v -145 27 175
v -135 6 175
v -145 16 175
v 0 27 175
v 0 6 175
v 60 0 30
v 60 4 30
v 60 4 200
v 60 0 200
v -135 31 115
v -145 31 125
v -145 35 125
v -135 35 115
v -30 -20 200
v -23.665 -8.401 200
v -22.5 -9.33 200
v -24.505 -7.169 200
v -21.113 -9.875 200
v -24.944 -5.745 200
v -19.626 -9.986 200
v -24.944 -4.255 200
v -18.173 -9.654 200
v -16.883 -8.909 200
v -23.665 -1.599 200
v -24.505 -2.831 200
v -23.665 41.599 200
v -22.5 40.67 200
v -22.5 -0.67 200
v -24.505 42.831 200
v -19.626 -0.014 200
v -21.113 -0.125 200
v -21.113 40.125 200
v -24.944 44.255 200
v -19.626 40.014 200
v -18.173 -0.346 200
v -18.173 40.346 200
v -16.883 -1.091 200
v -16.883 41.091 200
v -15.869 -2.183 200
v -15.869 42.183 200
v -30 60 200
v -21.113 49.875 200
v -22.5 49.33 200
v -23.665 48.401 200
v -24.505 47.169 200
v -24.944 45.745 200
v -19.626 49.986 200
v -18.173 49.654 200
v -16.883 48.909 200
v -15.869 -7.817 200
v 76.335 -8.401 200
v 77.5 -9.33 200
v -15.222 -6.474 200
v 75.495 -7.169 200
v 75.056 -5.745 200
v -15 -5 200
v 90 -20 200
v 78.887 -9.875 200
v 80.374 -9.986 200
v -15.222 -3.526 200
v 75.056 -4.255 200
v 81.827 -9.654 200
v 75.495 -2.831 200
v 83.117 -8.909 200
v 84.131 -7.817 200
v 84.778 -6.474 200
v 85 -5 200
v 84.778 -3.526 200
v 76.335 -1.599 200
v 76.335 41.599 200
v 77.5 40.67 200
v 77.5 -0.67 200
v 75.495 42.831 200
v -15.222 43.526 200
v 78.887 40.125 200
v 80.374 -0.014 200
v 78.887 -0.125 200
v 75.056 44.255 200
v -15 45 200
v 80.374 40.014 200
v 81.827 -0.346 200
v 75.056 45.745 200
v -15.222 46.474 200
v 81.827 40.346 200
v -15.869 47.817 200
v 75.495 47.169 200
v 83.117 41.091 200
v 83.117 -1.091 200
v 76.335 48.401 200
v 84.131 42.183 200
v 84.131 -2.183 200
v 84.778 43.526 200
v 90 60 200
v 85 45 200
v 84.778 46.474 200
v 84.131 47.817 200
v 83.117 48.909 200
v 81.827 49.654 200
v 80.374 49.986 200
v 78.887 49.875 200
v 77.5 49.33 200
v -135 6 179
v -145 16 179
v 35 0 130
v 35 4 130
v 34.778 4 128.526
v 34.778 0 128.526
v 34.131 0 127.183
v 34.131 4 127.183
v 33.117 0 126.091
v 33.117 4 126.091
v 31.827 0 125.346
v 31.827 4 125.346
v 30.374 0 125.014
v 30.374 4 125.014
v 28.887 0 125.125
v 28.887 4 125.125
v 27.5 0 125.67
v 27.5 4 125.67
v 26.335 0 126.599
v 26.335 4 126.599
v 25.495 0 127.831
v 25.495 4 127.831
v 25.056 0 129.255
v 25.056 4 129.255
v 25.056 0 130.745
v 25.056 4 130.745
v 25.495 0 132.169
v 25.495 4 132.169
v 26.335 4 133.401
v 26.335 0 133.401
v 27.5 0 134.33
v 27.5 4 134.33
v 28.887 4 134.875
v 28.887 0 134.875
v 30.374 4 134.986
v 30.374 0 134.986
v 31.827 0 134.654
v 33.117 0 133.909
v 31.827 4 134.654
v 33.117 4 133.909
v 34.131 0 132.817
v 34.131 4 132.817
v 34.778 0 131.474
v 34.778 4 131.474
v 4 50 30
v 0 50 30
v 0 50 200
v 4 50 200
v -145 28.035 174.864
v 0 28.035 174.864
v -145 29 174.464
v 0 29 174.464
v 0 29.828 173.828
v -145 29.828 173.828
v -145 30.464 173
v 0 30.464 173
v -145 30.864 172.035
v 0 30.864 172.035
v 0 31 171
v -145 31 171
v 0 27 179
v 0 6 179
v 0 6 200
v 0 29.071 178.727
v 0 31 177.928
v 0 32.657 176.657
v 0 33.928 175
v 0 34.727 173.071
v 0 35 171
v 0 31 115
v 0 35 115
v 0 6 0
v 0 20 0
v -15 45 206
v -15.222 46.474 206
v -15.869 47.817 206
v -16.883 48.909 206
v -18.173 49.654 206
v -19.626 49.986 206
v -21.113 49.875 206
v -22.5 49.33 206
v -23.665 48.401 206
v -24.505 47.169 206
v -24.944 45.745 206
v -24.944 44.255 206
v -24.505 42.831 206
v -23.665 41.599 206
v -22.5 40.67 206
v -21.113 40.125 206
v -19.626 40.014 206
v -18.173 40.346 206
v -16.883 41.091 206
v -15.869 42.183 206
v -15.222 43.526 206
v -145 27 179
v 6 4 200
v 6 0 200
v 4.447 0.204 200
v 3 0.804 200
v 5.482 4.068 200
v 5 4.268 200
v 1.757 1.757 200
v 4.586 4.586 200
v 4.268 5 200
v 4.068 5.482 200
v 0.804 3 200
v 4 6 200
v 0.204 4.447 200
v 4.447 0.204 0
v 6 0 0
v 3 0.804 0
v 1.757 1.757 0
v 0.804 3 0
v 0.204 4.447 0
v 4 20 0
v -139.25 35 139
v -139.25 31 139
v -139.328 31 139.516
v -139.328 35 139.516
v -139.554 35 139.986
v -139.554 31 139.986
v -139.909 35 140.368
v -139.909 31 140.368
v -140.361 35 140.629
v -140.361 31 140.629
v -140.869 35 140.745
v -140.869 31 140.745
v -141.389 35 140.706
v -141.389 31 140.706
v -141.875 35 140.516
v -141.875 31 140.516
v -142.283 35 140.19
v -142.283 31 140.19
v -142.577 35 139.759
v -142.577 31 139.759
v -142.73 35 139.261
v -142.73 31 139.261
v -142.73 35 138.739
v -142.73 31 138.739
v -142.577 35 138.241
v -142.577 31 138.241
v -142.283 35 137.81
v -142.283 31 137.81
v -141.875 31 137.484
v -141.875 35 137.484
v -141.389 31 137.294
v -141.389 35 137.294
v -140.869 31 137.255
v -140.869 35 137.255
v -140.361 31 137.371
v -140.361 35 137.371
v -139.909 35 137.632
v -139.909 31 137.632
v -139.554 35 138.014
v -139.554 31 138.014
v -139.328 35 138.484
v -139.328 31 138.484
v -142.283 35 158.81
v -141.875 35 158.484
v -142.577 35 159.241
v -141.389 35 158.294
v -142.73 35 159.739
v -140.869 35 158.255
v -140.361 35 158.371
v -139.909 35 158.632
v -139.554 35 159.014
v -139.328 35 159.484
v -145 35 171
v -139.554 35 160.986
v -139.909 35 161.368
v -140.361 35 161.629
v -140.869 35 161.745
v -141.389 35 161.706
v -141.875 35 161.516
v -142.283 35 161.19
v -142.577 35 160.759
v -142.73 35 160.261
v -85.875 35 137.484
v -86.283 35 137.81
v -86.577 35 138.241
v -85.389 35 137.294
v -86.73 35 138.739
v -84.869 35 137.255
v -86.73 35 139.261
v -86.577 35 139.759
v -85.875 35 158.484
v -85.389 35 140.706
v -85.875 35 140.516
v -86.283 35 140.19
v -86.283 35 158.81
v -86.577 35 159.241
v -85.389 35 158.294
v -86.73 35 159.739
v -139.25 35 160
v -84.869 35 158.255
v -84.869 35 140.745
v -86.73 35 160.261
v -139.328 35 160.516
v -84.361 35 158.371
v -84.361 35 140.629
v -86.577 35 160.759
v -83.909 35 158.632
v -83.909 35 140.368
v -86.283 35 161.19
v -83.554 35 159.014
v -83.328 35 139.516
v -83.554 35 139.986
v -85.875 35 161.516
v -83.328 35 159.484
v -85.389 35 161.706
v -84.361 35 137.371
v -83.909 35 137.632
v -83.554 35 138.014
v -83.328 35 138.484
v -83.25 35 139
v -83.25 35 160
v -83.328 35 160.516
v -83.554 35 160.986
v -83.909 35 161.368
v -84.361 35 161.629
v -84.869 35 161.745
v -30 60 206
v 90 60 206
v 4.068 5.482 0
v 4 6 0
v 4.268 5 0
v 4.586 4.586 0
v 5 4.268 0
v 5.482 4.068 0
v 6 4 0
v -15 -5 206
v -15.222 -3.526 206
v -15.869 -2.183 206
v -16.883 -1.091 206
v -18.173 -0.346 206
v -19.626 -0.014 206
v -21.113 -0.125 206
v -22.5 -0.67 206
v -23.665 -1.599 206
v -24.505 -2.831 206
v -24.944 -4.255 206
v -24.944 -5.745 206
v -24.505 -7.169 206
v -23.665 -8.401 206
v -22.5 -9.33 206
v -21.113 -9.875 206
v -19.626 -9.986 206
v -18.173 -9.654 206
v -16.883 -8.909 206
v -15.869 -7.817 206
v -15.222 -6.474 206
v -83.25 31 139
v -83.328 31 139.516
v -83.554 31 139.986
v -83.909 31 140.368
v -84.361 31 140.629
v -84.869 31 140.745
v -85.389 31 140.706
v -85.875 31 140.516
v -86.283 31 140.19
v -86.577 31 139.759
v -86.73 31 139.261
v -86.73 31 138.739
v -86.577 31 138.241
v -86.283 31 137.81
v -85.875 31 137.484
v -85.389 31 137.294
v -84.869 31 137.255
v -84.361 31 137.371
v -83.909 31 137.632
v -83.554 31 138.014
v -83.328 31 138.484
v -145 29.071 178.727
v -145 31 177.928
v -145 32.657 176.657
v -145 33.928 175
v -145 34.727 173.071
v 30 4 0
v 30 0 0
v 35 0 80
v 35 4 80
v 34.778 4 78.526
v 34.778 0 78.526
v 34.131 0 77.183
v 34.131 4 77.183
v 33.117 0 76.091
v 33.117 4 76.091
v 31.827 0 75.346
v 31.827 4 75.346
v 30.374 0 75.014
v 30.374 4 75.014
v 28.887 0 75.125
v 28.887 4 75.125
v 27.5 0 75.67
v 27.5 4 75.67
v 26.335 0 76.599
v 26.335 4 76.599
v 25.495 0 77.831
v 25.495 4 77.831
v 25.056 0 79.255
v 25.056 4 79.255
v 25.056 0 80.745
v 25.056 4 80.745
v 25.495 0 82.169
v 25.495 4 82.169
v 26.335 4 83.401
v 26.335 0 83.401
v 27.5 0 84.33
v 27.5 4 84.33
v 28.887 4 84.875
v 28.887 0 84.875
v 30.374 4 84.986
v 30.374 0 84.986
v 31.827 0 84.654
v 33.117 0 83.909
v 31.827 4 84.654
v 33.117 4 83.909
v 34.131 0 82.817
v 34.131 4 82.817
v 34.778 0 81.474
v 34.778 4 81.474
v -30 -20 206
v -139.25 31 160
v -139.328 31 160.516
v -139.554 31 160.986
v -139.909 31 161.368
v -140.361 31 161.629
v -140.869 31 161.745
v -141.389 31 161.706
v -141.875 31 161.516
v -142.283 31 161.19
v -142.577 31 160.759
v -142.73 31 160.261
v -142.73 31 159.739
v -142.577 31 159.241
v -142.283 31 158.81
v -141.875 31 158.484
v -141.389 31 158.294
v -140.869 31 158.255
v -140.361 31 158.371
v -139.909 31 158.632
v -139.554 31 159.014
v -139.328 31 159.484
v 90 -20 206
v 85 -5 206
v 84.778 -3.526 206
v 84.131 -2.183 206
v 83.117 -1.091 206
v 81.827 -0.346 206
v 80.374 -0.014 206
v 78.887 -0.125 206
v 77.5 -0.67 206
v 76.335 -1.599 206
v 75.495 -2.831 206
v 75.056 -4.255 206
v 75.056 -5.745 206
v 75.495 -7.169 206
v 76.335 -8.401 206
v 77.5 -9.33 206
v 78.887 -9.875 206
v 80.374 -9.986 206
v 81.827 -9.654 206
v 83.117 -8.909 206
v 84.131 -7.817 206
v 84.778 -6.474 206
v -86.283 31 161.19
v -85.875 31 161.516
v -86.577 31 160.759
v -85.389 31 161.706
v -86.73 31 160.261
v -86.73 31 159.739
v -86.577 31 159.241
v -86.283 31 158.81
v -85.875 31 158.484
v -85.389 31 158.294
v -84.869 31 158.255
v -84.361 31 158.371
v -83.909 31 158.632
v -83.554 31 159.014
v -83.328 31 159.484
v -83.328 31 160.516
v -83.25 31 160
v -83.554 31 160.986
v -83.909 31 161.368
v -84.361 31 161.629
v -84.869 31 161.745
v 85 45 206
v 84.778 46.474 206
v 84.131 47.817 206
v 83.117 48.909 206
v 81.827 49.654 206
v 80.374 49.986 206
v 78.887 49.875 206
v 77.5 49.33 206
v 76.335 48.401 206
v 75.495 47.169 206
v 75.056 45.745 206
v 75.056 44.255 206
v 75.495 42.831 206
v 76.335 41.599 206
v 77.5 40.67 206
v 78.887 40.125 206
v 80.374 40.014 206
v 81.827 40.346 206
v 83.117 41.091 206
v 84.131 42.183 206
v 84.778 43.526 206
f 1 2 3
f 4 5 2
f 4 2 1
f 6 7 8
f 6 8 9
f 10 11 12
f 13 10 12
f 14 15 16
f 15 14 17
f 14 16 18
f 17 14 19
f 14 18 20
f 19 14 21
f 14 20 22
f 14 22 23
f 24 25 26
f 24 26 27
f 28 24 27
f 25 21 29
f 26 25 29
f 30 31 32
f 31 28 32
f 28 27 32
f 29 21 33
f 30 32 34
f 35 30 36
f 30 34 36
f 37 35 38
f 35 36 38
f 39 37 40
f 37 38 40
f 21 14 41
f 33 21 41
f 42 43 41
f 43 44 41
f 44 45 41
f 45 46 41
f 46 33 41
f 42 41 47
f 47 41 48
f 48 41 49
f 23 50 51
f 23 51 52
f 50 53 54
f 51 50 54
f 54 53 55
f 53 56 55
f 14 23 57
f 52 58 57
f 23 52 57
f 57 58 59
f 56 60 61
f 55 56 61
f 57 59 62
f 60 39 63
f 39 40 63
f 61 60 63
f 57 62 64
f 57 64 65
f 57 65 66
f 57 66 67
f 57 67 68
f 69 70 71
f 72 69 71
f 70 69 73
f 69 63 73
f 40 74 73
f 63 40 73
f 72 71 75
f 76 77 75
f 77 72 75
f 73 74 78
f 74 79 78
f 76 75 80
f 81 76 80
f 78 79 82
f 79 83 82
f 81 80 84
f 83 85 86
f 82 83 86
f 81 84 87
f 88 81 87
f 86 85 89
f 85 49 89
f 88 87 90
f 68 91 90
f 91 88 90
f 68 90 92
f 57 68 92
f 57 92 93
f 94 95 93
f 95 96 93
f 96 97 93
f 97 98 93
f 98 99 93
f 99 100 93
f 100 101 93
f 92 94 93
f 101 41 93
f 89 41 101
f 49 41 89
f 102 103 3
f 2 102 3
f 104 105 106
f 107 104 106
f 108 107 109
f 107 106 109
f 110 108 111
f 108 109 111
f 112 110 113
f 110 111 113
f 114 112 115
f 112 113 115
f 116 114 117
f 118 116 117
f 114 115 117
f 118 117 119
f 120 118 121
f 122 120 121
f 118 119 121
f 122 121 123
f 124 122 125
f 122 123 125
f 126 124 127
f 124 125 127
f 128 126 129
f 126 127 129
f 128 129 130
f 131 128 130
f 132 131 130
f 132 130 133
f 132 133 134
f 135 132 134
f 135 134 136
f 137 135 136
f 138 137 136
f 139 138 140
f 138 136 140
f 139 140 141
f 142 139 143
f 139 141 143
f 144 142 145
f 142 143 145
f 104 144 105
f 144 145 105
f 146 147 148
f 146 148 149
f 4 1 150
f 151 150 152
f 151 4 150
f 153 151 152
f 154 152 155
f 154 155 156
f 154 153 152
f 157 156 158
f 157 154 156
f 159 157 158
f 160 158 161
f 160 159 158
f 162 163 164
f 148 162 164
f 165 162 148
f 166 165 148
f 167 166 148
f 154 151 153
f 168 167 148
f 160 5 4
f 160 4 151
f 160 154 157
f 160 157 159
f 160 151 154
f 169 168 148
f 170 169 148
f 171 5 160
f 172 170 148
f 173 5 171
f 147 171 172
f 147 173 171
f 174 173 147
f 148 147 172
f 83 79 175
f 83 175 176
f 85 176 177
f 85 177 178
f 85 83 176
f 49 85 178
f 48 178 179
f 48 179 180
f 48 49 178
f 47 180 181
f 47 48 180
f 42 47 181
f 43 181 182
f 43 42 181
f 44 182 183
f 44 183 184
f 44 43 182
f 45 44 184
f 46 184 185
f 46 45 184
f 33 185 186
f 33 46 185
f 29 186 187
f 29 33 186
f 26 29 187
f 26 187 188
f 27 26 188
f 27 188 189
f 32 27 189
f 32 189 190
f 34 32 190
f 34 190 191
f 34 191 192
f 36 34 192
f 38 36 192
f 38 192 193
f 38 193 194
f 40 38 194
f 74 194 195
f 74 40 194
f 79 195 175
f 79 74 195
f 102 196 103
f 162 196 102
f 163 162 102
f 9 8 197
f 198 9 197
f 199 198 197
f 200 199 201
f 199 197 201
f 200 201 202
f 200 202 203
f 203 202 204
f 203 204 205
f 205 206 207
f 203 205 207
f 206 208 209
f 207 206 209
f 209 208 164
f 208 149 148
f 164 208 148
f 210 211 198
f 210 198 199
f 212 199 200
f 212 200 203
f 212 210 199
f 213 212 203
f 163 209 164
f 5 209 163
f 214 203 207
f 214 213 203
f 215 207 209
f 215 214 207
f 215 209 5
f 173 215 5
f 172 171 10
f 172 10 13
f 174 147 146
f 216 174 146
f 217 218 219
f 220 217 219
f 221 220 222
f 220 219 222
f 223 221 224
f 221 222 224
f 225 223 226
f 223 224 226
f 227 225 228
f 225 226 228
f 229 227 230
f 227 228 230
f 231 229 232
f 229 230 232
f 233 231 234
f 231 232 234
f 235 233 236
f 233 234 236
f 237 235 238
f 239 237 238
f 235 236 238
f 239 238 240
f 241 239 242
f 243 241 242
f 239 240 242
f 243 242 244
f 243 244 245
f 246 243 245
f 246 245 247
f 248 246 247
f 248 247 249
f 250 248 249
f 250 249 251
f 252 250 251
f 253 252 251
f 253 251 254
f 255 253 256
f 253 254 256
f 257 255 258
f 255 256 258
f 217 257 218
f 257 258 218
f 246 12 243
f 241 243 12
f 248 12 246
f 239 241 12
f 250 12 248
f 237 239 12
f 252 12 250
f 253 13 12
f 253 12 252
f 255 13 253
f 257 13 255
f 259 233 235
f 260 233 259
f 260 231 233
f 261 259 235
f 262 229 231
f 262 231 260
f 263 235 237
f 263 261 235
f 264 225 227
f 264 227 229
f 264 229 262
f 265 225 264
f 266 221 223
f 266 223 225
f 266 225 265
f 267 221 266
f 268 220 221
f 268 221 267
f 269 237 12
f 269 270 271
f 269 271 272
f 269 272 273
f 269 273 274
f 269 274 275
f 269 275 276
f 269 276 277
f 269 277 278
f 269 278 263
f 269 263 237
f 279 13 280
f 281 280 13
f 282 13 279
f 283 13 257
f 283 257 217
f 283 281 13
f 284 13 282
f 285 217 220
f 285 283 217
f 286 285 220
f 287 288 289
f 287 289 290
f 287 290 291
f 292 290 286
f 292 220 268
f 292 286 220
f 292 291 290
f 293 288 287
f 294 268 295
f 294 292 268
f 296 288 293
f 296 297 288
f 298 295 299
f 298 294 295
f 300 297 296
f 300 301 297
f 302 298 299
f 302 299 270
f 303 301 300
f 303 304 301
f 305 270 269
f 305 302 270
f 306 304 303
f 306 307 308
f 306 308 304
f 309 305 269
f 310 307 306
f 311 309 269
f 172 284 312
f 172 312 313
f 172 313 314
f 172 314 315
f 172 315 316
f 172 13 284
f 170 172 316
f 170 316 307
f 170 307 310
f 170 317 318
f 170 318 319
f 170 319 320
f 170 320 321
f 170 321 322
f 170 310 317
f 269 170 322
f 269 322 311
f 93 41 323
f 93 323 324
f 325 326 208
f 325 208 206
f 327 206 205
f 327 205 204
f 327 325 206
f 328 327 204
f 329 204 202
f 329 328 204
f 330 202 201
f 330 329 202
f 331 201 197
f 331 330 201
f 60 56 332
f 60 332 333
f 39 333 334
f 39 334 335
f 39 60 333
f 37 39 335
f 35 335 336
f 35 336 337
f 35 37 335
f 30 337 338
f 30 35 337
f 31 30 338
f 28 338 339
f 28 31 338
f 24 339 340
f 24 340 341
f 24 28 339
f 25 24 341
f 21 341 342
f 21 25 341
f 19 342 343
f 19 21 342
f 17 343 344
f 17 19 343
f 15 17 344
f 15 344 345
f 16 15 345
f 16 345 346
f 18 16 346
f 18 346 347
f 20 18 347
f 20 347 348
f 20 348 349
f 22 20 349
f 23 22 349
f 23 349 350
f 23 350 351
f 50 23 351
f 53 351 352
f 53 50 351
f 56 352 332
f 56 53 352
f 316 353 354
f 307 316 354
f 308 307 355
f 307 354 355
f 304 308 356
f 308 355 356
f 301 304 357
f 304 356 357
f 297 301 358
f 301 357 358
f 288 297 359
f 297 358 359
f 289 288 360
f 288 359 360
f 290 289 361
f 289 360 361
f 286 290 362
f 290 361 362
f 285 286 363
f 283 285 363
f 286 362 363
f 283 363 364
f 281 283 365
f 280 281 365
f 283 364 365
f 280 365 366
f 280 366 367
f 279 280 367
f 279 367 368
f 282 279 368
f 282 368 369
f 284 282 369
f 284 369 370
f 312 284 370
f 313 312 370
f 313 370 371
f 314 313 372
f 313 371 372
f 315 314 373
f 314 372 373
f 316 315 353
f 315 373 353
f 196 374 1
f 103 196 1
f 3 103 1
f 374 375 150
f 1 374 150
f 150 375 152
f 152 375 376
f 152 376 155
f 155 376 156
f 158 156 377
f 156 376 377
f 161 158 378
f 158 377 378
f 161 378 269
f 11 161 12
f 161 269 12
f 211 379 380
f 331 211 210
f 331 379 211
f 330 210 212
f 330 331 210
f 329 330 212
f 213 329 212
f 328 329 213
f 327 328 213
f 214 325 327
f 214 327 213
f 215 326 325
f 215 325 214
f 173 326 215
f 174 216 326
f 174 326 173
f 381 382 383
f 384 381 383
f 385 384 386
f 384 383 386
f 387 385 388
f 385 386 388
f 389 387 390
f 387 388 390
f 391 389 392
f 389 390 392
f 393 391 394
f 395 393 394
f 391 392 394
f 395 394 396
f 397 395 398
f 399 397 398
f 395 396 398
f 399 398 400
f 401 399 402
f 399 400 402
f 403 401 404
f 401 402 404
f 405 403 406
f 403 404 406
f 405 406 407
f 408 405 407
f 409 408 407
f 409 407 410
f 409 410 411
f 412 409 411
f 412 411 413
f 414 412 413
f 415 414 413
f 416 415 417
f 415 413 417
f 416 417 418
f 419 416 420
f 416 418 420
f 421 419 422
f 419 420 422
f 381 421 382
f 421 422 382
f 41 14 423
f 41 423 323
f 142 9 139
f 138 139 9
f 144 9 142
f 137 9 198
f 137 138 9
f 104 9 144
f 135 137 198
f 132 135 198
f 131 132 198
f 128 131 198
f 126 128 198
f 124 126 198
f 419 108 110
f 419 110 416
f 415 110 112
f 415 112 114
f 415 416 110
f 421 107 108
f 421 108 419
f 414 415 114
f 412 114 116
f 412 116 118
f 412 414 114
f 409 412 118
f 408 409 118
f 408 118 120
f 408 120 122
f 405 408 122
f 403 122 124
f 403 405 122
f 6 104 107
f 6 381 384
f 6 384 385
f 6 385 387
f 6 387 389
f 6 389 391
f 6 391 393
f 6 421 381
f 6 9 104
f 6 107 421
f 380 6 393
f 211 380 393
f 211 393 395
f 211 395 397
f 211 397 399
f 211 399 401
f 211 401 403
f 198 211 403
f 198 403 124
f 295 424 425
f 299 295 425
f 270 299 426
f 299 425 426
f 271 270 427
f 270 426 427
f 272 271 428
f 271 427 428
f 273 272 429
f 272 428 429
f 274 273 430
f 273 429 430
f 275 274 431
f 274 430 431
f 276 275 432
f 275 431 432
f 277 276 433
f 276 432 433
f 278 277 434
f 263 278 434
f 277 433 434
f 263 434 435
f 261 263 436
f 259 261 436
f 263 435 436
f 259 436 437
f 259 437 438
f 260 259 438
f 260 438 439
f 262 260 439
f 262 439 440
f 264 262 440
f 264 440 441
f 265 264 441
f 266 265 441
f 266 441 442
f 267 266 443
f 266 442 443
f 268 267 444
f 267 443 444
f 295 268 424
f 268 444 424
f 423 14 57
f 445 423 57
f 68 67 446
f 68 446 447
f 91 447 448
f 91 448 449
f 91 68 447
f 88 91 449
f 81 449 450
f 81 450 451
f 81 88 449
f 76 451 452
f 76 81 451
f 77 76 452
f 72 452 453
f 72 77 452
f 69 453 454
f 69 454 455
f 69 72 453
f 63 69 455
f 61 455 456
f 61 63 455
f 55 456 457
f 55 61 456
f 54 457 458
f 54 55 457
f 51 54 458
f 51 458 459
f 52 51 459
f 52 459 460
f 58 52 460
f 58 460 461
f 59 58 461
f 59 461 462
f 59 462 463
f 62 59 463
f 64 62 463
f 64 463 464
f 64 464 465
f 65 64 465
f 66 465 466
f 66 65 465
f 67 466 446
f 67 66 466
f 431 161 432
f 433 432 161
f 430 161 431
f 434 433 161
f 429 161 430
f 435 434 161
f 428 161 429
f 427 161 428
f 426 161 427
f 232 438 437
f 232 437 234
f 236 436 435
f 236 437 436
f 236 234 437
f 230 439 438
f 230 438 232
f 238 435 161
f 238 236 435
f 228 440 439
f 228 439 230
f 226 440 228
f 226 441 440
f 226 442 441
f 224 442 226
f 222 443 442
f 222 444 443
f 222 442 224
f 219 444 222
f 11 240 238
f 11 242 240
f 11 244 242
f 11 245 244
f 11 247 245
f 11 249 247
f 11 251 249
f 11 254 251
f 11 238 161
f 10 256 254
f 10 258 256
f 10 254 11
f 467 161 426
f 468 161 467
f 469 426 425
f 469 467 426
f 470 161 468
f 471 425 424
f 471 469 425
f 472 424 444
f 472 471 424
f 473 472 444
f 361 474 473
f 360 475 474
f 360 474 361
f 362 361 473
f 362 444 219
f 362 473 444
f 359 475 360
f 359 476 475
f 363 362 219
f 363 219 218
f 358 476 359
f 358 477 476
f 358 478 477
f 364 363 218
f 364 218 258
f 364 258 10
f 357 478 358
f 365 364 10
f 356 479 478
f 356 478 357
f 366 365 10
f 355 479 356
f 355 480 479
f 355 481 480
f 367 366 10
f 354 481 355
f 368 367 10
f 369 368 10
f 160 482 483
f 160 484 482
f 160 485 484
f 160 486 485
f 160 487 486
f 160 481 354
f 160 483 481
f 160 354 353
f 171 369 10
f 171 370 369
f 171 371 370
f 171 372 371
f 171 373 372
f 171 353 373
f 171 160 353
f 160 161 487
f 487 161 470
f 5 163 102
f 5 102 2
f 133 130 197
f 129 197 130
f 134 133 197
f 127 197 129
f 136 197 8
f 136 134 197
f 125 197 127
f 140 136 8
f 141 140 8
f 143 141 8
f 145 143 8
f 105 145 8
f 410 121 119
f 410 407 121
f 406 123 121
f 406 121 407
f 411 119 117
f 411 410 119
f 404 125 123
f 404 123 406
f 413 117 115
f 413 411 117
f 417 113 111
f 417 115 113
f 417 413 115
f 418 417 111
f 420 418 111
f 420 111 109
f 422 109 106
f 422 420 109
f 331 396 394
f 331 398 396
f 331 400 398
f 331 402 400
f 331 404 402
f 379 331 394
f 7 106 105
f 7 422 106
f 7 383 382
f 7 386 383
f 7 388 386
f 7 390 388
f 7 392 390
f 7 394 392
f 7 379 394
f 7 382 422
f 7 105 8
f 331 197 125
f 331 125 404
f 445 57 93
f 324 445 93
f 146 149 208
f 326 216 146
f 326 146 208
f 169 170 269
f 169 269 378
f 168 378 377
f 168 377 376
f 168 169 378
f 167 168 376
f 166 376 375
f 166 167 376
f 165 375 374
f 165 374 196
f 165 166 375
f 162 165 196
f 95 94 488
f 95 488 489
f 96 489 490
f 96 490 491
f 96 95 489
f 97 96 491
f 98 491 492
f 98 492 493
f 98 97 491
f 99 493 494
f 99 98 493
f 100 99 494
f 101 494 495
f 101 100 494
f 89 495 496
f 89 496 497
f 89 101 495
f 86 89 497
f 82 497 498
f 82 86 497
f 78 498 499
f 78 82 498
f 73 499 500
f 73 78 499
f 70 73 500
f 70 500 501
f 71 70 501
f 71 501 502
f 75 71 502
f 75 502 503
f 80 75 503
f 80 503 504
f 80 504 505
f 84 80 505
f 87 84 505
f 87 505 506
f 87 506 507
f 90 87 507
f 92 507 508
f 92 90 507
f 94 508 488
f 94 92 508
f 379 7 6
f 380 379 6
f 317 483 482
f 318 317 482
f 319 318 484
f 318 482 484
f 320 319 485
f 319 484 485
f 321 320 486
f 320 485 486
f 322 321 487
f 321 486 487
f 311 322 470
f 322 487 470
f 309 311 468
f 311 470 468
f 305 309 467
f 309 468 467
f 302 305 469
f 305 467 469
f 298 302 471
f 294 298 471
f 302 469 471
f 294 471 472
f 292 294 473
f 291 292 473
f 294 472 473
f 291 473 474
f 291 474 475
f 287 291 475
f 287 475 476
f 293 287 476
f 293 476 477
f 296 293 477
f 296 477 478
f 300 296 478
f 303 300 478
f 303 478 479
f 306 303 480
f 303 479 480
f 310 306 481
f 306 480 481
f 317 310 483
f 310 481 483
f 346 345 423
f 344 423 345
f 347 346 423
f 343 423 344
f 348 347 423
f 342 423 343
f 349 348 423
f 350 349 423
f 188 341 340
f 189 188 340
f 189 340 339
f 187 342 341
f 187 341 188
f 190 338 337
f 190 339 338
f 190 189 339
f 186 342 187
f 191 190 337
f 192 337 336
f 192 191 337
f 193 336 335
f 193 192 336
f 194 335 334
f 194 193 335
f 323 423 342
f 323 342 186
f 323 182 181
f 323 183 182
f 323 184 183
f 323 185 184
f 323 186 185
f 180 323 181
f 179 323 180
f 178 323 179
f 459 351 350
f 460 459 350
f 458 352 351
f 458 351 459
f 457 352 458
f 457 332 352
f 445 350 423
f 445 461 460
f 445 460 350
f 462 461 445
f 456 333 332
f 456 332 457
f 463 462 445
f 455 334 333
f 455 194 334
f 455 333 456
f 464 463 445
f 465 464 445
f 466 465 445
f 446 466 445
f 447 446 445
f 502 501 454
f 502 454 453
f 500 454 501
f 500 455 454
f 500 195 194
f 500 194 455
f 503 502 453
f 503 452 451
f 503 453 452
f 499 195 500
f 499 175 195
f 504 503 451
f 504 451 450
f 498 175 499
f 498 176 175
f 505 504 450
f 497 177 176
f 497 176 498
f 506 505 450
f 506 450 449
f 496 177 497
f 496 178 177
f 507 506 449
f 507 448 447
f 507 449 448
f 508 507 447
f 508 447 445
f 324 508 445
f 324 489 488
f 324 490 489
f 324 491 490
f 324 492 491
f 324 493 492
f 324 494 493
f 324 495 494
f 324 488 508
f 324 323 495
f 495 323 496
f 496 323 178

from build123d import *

# Parameters (mm, degrees)
EXTRUDE_1_DEPTH     = 200
SKETCH_2_W          = 120
SKETCH_2_H          = 80
SKETCH_2_R          = 5
EXTRUDE_2_DEPTH     = 6
CHAMFER_1_SIZE      = 30
SKETCH_3_R          = 5
CUT_EXTRUDE_1_DEPTH = 4
EXTRUDE_3_DEPTH     = 145
CHAMFER_2_SIZE      = 10
SKETCH_7_R          = 1.75
CUT_EXTRUDE_2_DEPTH = 4


with BuildPart() as part:
    # 草图1 → 凸台-拉伸1 (new body)
    with BuildSketch(Plane.XY):
        with BuildLine():
            Line((0, 6), (0, 50))
            Line((0, 50), (4, 50))
            Line((4, 50), (4, 6))
            ThreePointArc((4, 6), (4.585786438, 4.585786438), (6, 4))
            Line((6, 4), (60, 4))
            Line((60, 4), (60, 0))
            Line((60, 0), (6, 0))
            ThreePointArc((6, 0), (1.757359313, 1.757359313), (0, 6))
        make_face()
    extrude(amount=EXTRUDE_1_DEPTH)

    # 倒角1
    chamfer_1_edges = [part.edges().sort_by_distance(p)[0] for p in [
        (2, 50, 0),
        (60, 2, 0),
    ]]
    chamfer(chamfer_1_edges, length=CHAMFER_1_SIZE)

    # 草图3 → 切除-拉伸1 (cut)
    with BuildSketch(Plane(origin=(0, 4, 0), x_dir=(1, 0, 0), z_dir=(0, 1, 0))):
        with Locations((30, -130)):
            Circle(SKETCH_3_R)
        with Locations((30, -80)):
            Circle(SKETCH_3_R)
    extrude(amount=-CUT_EXTRUDE_1_DEPTH, mode=Mode.SUBTRACT)

    # 草图4 → 凸台-拉伸3 (add)
    with BuildSketch(Plane.ZY):
        with BuildLine():
            Line((179, 6), (175, 6))
            Line((175, 6), (175, 27))
            ThreePointArc((175, 27), (173.828427125, 29.828427125), (171, 31))
            Line((171, 31), (115, 31))
            Line((115, 31), (115, 35))
            Line((115, 35), (171, 35))
            ThreePointArc((171, 35), (176.656854249, 32.656854249), (179, 27))
            Line((179, 27), (179, 6))
        make_face()
    extrude(amount=EXTRUDE_3_DEPTH)

    # 倒角2
    chamfer_2_edges = [part.edges().sort_by_distance(p)[0] for p in [
        (-145, 6, 177),
        (-145, 33, 115),
    ]]
    chamfer(chamfer_2_edges, length=CHAMFER_2_SIZE)

    # 草图7 → 切除-拉伸2 (cut)
    with BuildSketch(Plane.XZ.offset(-31)):
        with Locations((-141, 160)):
            Circle(SKETCH_7_R)
        with Locations((-141, 139)):
            Circle(SKETCH_7_R)
        with Locations((-85, 139)):
            Circle(SKETCH_7_R)
        with Locations((-85, 160)):
            Circle(SKETCH_7_R)
    extrude(amount=-CUT_EXTRUDE_2_DEPTH, mode=Mode.SUBTRACT)


with BuildPart() as body_2:
    # 草图2 → 凸台-拉伸2 (new body)
    with BuildSketch(Plane.XY.offset(200)):
        with Locations((30, 20)):
            Rectangle(SKETCH_2_W, SKETCH_2_H)
        with Locations((-20, 45)):
            Circle(SKETCH_2_R, mode=Mode.SUBTRACT)
        with Locations((80, 45)):
            Circle(SKETCH_2_R, mode=Mode.SUBTRACT)
        with Locations((-20, -5)):
            Circle(SKETCH_2_R, mode=Mode.SUBTRACT)
        with Locations((80, -5)):
            Circle(SKETCH_2_R, mode=Mode.SUBTRACT)
    extrude(amount=EXTRUDE_2_DEPTH)


solid = Compound([part.part, body_2.part])
